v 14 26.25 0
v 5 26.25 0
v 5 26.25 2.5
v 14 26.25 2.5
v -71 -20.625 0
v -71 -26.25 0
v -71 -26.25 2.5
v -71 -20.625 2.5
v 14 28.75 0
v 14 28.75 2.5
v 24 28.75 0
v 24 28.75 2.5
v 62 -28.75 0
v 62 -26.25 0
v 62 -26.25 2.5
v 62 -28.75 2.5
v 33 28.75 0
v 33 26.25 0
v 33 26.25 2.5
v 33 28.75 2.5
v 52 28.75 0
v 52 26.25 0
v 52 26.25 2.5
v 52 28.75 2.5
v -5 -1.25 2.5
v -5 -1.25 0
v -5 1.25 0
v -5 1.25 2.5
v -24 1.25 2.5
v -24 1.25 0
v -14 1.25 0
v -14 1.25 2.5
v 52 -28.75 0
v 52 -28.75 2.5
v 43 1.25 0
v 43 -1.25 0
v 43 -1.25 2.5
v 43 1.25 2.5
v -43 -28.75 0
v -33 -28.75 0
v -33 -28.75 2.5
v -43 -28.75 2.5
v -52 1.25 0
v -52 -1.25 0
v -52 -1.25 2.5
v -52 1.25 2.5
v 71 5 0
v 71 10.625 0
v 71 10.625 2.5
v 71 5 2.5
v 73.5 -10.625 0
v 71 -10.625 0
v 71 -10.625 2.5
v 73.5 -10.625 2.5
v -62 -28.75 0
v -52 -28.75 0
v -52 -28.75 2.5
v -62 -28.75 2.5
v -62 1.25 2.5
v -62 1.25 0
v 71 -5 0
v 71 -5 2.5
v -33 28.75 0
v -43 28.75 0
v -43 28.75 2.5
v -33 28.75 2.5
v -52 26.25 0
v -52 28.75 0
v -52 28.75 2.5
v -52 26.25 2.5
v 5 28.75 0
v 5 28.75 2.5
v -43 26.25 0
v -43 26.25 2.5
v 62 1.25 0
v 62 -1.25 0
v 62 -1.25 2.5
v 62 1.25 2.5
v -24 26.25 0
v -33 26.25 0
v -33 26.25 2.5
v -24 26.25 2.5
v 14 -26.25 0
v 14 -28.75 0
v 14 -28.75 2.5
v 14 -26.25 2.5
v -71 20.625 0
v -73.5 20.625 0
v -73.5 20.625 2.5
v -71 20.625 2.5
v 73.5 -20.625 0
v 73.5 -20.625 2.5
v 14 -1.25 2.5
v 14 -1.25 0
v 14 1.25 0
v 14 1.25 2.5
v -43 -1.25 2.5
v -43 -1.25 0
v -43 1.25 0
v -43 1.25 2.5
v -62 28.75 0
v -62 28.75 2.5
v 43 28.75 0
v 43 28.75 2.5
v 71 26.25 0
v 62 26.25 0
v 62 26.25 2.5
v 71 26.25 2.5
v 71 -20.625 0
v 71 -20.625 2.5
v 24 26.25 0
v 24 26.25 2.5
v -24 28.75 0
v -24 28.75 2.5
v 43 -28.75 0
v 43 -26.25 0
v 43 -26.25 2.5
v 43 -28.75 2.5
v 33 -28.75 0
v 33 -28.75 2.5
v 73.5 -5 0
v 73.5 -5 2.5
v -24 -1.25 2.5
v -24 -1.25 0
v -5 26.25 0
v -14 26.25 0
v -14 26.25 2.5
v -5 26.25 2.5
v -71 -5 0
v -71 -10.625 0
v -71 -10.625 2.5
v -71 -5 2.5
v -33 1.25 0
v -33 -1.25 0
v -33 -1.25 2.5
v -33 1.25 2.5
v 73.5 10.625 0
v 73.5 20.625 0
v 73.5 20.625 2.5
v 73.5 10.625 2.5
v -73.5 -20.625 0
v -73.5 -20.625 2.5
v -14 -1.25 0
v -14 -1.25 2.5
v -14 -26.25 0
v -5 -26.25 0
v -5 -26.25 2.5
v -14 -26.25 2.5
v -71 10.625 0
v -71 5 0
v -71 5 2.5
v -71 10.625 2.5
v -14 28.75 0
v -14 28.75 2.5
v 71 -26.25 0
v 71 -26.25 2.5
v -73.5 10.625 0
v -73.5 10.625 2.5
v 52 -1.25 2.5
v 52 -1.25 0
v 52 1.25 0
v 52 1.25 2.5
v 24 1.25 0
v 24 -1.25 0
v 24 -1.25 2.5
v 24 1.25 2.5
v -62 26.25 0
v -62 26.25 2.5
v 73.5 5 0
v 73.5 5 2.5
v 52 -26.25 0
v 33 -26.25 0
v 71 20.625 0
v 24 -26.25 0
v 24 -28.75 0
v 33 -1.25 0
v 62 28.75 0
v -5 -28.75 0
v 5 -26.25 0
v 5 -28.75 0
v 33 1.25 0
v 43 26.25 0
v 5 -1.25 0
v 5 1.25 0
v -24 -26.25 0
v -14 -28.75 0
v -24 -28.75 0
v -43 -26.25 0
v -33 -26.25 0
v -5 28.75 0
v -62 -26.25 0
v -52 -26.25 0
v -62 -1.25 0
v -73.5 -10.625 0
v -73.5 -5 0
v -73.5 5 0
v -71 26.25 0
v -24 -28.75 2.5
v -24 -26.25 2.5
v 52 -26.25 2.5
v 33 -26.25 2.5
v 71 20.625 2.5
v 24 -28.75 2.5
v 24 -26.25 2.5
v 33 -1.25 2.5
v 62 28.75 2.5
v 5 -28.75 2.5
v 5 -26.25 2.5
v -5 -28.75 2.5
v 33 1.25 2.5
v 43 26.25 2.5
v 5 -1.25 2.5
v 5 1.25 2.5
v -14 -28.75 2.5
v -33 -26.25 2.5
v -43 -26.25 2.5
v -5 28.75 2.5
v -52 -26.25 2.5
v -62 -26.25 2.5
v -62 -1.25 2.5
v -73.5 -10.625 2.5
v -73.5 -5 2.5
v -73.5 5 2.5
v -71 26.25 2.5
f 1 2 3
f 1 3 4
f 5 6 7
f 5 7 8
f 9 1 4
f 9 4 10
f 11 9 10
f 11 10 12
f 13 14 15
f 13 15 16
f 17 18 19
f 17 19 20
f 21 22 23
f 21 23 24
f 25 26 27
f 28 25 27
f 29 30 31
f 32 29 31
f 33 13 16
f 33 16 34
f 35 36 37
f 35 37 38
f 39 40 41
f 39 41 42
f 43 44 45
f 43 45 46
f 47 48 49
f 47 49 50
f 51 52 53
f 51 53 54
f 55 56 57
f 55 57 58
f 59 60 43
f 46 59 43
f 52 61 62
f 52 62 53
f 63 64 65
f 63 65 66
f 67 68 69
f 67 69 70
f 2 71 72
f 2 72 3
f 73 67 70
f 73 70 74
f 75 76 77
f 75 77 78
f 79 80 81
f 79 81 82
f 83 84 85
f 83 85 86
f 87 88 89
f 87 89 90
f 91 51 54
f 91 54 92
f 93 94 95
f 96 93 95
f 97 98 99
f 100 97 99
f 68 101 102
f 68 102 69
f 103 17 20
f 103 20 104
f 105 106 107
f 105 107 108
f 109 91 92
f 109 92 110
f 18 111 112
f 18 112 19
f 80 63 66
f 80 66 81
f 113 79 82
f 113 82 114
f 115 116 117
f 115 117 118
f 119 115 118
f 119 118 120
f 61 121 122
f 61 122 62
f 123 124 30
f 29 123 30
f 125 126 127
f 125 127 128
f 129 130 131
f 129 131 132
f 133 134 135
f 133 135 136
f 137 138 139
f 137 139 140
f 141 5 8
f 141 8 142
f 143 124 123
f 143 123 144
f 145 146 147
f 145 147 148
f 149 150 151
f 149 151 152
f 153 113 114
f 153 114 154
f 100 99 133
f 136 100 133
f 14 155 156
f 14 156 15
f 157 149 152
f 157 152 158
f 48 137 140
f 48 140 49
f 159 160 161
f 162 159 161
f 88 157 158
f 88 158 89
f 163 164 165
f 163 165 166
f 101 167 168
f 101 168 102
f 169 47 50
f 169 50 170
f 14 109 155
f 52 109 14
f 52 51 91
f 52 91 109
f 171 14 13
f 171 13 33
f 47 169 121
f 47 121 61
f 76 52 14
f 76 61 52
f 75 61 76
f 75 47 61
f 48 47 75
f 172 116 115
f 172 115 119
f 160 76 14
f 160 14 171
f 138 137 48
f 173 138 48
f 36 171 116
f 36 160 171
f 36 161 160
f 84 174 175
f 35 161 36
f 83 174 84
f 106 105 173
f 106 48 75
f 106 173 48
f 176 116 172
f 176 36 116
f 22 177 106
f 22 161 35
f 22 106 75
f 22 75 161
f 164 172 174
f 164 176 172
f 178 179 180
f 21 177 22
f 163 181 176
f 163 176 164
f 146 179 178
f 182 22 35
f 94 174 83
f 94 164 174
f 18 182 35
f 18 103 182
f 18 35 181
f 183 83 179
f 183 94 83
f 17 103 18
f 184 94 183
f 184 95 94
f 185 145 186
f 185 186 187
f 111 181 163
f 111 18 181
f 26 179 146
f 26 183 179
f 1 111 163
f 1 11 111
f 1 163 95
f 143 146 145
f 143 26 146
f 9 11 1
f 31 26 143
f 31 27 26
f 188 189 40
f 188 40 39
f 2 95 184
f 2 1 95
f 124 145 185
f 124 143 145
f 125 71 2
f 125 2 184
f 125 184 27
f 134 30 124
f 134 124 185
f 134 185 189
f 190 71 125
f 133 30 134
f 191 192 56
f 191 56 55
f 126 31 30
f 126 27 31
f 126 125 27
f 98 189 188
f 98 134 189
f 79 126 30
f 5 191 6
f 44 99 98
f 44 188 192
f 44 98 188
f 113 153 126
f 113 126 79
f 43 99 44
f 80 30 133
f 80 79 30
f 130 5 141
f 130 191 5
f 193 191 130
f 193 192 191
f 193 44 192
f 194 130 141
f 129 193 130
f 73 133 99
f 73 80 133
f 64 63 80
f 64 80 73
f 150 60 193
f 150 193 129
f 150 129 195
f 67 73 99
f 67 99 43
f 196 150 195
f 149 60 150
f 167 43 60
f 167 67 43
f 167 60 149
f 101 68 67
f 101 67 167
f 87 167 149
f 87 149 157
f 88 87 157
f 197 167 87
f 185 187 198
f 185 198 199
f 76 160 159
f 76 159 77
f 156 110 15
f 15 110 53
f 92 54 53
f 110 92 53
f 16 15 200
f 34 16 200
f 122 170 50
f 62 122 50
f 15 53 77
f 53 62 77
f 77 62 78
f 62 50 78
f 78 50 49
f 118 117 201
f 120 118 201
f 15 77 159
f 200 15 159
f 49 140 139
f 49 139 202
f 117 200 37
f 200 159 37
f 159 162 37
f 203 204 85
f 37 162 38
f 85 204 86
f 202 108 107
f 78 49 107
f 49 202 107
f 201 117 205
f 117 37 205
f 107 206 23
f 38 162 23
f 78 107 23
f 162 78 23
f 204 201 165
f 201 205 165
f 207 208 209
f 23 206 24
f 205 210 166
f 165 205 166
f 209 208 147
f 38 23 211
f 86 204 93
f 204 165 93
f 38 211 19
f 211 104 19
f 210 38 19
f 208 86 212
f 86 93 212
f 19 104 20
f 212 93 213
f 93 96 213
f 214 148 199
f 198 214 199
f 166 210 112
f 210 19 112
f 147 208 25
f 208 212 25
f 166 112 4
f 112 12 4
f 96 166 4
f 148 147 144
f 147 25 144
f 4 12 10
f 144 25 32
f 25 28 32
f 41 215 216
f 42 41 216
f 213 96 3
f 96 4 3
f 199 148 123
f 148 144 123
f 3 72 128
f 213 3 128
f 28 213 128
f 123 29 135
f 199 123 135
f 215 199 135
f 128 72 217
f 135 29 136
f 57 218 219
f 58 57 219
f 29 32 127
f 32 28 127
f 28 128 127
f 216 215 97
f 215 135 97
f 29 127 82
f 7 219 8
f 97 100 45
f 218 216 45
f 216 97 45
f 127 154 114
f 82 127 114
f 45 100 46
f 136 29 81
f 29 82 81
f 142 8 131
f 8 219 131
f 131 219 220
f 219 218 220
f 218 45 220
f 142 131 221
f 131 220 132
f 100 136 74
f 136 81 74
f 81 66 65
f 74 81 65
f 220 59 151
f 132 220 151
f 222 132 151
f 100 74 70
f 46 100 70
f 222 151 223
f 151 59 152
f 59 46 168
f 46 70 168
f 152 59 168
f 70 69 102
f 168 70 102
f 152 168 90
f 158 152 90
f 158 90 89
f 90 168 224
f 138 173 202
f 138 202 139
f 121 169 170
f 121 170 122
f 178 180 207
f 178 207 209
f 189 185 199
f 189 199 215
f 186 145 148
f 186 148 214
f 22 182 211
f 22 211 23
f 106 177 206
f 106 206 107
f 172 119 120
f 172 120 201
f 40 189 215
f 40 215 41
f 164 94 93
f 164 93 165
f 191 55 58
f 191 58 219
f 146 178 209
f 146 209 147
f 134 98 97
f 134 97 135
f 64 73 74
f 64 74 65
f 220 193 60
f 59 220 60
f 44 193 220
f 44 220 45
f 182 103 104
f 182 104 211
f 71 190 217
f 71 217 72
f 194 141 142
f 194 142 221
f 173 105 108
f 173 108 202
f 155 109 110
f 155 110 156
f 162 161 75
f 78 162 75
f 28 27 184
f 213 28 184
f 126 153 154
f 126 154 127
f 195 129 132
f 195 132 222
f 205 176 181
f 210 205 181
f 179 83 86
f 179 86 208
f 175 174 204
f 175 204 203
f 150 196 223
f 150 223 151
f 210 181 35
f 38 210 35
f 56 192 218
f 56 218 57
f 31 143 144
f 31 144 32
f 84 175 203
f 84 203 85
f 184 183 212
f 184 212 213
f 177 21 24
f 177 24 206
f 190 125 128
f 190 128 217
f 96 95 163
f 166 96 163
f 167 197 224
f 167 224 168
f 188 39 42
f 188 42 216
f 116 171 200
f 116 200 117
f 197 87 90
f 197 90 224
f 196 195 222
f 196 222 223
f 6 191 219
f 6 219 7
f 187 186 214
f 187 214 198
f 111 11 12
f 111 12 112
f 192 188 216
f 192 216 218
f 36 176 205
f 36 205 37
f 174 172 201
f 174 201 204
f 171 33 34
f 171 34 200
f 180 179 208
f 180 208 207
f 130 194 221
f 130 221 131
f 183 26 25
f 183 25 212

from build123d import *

# Parameters (mm, degrees)
SKETCH1_W           = 10
SKETCH1_H           = 2.5
BOSS_EXTRUDE1_DEPTH = 2.5


with BuildPart() as part:
    # Sketch1 → Boss-Extrude1 (new body)
    with BuildSketch(Plane.XY):
        Polygon((-62, 26.25), (-62, 28.75), (-52, 28.75), (-52, 26.25), (-43, 26.25), (-43, 28.75), (-33, 28.75), (-33, 26.25), (-24, 26.25), (-24, 28.75), (-14, 28.75), (-14, 26.25), (-5, 26.25), (-5, 28.75), (5, 28.75), (5, 26.25), (14, 26.25), (14, 28.75), (24, 28.75), (24, 26.25), (33, 26.25), (33, 28.75), (43, 28.75), (43, 26.25), (52, 26.25), (52, 28.75), (62, 28.75), (62, 26.25), (71, 26.25), (71, 20.625), (73.5, 20.625), (73.5, 10.625), (71, 10.625), (71, 5), (73.5, 5), (73.5, -5), (71, -5), (71, -10.625), (73.5, -10.625), (73.5, -20.625), (71, -20.625), (71, -26.25), (62, -26.25), (62, -28.75), (52, -28.75), (52, -26.25), (43, -26.25), (43, -28.75), (33, -28.75), (33, -26.25), (24, -26.25), (24, -28.75), (14, -28.75), (14, -26.25), (5, -26.25), (5, -28.75), (-5, -28.75), (-5, -26.25), (-14, -26.25), (-14, -28.75), (-24, -28.75), (-24, -26.25), (-33, -26.25), (-33, -28.75), (-43, -28.75), (-43, -26.25), (-52, -26.25), (-52, -28.75), (-62, -28.75), (-62, -26.25), (-71, -26.25), (-71, -20.625), (-73.5, -20.625), (-73.5, -10.625), (-71, -10.625), (-71, -5), (-73.5, -5), (-73.5, 5), (-71, 5), (-71, 10.625), (-73.5, 10.625), (-73.5, 20.625), (-71, 20.625), (-71, 26.25), align=None)
        with Locations((-38, 0)):
            Rectangle(SKETCH1_W, SKETCH1_H, mode=Mode.SUBTRACT)
        with Locations((-57, 0)):
            Rectangle(SKETCH1_W, SKETCH1_H, mode=Mode.SUBTRACT)
        with Locations((-19, 0)):
            Rectangle(SKETCH1_W, SKETCH1_H, mode=Mode.SUBTRACT)
        Rectangle(SKETCH1_W, SKETCH1_H, mode=Mode.SUBTRACT)
        with Locations((19, 0)):
            Rectangle(SKETCH1_W, SKETCH1_H, mode=Mode.SUBTRACT)
        with Locations((38, 0)):
            Rectangle(SKETCH1_W, SKETCH1_H, mode=Mode.SUBTRACT)
        with Locations((57, 0)):
            Rectangle(SKETCH1_W, SKETCH1_H, mode=Mode.SUBTRACT)
    extrude(amount=BOSS_EXTRUDE1_DEPTH)


solid = part.part
